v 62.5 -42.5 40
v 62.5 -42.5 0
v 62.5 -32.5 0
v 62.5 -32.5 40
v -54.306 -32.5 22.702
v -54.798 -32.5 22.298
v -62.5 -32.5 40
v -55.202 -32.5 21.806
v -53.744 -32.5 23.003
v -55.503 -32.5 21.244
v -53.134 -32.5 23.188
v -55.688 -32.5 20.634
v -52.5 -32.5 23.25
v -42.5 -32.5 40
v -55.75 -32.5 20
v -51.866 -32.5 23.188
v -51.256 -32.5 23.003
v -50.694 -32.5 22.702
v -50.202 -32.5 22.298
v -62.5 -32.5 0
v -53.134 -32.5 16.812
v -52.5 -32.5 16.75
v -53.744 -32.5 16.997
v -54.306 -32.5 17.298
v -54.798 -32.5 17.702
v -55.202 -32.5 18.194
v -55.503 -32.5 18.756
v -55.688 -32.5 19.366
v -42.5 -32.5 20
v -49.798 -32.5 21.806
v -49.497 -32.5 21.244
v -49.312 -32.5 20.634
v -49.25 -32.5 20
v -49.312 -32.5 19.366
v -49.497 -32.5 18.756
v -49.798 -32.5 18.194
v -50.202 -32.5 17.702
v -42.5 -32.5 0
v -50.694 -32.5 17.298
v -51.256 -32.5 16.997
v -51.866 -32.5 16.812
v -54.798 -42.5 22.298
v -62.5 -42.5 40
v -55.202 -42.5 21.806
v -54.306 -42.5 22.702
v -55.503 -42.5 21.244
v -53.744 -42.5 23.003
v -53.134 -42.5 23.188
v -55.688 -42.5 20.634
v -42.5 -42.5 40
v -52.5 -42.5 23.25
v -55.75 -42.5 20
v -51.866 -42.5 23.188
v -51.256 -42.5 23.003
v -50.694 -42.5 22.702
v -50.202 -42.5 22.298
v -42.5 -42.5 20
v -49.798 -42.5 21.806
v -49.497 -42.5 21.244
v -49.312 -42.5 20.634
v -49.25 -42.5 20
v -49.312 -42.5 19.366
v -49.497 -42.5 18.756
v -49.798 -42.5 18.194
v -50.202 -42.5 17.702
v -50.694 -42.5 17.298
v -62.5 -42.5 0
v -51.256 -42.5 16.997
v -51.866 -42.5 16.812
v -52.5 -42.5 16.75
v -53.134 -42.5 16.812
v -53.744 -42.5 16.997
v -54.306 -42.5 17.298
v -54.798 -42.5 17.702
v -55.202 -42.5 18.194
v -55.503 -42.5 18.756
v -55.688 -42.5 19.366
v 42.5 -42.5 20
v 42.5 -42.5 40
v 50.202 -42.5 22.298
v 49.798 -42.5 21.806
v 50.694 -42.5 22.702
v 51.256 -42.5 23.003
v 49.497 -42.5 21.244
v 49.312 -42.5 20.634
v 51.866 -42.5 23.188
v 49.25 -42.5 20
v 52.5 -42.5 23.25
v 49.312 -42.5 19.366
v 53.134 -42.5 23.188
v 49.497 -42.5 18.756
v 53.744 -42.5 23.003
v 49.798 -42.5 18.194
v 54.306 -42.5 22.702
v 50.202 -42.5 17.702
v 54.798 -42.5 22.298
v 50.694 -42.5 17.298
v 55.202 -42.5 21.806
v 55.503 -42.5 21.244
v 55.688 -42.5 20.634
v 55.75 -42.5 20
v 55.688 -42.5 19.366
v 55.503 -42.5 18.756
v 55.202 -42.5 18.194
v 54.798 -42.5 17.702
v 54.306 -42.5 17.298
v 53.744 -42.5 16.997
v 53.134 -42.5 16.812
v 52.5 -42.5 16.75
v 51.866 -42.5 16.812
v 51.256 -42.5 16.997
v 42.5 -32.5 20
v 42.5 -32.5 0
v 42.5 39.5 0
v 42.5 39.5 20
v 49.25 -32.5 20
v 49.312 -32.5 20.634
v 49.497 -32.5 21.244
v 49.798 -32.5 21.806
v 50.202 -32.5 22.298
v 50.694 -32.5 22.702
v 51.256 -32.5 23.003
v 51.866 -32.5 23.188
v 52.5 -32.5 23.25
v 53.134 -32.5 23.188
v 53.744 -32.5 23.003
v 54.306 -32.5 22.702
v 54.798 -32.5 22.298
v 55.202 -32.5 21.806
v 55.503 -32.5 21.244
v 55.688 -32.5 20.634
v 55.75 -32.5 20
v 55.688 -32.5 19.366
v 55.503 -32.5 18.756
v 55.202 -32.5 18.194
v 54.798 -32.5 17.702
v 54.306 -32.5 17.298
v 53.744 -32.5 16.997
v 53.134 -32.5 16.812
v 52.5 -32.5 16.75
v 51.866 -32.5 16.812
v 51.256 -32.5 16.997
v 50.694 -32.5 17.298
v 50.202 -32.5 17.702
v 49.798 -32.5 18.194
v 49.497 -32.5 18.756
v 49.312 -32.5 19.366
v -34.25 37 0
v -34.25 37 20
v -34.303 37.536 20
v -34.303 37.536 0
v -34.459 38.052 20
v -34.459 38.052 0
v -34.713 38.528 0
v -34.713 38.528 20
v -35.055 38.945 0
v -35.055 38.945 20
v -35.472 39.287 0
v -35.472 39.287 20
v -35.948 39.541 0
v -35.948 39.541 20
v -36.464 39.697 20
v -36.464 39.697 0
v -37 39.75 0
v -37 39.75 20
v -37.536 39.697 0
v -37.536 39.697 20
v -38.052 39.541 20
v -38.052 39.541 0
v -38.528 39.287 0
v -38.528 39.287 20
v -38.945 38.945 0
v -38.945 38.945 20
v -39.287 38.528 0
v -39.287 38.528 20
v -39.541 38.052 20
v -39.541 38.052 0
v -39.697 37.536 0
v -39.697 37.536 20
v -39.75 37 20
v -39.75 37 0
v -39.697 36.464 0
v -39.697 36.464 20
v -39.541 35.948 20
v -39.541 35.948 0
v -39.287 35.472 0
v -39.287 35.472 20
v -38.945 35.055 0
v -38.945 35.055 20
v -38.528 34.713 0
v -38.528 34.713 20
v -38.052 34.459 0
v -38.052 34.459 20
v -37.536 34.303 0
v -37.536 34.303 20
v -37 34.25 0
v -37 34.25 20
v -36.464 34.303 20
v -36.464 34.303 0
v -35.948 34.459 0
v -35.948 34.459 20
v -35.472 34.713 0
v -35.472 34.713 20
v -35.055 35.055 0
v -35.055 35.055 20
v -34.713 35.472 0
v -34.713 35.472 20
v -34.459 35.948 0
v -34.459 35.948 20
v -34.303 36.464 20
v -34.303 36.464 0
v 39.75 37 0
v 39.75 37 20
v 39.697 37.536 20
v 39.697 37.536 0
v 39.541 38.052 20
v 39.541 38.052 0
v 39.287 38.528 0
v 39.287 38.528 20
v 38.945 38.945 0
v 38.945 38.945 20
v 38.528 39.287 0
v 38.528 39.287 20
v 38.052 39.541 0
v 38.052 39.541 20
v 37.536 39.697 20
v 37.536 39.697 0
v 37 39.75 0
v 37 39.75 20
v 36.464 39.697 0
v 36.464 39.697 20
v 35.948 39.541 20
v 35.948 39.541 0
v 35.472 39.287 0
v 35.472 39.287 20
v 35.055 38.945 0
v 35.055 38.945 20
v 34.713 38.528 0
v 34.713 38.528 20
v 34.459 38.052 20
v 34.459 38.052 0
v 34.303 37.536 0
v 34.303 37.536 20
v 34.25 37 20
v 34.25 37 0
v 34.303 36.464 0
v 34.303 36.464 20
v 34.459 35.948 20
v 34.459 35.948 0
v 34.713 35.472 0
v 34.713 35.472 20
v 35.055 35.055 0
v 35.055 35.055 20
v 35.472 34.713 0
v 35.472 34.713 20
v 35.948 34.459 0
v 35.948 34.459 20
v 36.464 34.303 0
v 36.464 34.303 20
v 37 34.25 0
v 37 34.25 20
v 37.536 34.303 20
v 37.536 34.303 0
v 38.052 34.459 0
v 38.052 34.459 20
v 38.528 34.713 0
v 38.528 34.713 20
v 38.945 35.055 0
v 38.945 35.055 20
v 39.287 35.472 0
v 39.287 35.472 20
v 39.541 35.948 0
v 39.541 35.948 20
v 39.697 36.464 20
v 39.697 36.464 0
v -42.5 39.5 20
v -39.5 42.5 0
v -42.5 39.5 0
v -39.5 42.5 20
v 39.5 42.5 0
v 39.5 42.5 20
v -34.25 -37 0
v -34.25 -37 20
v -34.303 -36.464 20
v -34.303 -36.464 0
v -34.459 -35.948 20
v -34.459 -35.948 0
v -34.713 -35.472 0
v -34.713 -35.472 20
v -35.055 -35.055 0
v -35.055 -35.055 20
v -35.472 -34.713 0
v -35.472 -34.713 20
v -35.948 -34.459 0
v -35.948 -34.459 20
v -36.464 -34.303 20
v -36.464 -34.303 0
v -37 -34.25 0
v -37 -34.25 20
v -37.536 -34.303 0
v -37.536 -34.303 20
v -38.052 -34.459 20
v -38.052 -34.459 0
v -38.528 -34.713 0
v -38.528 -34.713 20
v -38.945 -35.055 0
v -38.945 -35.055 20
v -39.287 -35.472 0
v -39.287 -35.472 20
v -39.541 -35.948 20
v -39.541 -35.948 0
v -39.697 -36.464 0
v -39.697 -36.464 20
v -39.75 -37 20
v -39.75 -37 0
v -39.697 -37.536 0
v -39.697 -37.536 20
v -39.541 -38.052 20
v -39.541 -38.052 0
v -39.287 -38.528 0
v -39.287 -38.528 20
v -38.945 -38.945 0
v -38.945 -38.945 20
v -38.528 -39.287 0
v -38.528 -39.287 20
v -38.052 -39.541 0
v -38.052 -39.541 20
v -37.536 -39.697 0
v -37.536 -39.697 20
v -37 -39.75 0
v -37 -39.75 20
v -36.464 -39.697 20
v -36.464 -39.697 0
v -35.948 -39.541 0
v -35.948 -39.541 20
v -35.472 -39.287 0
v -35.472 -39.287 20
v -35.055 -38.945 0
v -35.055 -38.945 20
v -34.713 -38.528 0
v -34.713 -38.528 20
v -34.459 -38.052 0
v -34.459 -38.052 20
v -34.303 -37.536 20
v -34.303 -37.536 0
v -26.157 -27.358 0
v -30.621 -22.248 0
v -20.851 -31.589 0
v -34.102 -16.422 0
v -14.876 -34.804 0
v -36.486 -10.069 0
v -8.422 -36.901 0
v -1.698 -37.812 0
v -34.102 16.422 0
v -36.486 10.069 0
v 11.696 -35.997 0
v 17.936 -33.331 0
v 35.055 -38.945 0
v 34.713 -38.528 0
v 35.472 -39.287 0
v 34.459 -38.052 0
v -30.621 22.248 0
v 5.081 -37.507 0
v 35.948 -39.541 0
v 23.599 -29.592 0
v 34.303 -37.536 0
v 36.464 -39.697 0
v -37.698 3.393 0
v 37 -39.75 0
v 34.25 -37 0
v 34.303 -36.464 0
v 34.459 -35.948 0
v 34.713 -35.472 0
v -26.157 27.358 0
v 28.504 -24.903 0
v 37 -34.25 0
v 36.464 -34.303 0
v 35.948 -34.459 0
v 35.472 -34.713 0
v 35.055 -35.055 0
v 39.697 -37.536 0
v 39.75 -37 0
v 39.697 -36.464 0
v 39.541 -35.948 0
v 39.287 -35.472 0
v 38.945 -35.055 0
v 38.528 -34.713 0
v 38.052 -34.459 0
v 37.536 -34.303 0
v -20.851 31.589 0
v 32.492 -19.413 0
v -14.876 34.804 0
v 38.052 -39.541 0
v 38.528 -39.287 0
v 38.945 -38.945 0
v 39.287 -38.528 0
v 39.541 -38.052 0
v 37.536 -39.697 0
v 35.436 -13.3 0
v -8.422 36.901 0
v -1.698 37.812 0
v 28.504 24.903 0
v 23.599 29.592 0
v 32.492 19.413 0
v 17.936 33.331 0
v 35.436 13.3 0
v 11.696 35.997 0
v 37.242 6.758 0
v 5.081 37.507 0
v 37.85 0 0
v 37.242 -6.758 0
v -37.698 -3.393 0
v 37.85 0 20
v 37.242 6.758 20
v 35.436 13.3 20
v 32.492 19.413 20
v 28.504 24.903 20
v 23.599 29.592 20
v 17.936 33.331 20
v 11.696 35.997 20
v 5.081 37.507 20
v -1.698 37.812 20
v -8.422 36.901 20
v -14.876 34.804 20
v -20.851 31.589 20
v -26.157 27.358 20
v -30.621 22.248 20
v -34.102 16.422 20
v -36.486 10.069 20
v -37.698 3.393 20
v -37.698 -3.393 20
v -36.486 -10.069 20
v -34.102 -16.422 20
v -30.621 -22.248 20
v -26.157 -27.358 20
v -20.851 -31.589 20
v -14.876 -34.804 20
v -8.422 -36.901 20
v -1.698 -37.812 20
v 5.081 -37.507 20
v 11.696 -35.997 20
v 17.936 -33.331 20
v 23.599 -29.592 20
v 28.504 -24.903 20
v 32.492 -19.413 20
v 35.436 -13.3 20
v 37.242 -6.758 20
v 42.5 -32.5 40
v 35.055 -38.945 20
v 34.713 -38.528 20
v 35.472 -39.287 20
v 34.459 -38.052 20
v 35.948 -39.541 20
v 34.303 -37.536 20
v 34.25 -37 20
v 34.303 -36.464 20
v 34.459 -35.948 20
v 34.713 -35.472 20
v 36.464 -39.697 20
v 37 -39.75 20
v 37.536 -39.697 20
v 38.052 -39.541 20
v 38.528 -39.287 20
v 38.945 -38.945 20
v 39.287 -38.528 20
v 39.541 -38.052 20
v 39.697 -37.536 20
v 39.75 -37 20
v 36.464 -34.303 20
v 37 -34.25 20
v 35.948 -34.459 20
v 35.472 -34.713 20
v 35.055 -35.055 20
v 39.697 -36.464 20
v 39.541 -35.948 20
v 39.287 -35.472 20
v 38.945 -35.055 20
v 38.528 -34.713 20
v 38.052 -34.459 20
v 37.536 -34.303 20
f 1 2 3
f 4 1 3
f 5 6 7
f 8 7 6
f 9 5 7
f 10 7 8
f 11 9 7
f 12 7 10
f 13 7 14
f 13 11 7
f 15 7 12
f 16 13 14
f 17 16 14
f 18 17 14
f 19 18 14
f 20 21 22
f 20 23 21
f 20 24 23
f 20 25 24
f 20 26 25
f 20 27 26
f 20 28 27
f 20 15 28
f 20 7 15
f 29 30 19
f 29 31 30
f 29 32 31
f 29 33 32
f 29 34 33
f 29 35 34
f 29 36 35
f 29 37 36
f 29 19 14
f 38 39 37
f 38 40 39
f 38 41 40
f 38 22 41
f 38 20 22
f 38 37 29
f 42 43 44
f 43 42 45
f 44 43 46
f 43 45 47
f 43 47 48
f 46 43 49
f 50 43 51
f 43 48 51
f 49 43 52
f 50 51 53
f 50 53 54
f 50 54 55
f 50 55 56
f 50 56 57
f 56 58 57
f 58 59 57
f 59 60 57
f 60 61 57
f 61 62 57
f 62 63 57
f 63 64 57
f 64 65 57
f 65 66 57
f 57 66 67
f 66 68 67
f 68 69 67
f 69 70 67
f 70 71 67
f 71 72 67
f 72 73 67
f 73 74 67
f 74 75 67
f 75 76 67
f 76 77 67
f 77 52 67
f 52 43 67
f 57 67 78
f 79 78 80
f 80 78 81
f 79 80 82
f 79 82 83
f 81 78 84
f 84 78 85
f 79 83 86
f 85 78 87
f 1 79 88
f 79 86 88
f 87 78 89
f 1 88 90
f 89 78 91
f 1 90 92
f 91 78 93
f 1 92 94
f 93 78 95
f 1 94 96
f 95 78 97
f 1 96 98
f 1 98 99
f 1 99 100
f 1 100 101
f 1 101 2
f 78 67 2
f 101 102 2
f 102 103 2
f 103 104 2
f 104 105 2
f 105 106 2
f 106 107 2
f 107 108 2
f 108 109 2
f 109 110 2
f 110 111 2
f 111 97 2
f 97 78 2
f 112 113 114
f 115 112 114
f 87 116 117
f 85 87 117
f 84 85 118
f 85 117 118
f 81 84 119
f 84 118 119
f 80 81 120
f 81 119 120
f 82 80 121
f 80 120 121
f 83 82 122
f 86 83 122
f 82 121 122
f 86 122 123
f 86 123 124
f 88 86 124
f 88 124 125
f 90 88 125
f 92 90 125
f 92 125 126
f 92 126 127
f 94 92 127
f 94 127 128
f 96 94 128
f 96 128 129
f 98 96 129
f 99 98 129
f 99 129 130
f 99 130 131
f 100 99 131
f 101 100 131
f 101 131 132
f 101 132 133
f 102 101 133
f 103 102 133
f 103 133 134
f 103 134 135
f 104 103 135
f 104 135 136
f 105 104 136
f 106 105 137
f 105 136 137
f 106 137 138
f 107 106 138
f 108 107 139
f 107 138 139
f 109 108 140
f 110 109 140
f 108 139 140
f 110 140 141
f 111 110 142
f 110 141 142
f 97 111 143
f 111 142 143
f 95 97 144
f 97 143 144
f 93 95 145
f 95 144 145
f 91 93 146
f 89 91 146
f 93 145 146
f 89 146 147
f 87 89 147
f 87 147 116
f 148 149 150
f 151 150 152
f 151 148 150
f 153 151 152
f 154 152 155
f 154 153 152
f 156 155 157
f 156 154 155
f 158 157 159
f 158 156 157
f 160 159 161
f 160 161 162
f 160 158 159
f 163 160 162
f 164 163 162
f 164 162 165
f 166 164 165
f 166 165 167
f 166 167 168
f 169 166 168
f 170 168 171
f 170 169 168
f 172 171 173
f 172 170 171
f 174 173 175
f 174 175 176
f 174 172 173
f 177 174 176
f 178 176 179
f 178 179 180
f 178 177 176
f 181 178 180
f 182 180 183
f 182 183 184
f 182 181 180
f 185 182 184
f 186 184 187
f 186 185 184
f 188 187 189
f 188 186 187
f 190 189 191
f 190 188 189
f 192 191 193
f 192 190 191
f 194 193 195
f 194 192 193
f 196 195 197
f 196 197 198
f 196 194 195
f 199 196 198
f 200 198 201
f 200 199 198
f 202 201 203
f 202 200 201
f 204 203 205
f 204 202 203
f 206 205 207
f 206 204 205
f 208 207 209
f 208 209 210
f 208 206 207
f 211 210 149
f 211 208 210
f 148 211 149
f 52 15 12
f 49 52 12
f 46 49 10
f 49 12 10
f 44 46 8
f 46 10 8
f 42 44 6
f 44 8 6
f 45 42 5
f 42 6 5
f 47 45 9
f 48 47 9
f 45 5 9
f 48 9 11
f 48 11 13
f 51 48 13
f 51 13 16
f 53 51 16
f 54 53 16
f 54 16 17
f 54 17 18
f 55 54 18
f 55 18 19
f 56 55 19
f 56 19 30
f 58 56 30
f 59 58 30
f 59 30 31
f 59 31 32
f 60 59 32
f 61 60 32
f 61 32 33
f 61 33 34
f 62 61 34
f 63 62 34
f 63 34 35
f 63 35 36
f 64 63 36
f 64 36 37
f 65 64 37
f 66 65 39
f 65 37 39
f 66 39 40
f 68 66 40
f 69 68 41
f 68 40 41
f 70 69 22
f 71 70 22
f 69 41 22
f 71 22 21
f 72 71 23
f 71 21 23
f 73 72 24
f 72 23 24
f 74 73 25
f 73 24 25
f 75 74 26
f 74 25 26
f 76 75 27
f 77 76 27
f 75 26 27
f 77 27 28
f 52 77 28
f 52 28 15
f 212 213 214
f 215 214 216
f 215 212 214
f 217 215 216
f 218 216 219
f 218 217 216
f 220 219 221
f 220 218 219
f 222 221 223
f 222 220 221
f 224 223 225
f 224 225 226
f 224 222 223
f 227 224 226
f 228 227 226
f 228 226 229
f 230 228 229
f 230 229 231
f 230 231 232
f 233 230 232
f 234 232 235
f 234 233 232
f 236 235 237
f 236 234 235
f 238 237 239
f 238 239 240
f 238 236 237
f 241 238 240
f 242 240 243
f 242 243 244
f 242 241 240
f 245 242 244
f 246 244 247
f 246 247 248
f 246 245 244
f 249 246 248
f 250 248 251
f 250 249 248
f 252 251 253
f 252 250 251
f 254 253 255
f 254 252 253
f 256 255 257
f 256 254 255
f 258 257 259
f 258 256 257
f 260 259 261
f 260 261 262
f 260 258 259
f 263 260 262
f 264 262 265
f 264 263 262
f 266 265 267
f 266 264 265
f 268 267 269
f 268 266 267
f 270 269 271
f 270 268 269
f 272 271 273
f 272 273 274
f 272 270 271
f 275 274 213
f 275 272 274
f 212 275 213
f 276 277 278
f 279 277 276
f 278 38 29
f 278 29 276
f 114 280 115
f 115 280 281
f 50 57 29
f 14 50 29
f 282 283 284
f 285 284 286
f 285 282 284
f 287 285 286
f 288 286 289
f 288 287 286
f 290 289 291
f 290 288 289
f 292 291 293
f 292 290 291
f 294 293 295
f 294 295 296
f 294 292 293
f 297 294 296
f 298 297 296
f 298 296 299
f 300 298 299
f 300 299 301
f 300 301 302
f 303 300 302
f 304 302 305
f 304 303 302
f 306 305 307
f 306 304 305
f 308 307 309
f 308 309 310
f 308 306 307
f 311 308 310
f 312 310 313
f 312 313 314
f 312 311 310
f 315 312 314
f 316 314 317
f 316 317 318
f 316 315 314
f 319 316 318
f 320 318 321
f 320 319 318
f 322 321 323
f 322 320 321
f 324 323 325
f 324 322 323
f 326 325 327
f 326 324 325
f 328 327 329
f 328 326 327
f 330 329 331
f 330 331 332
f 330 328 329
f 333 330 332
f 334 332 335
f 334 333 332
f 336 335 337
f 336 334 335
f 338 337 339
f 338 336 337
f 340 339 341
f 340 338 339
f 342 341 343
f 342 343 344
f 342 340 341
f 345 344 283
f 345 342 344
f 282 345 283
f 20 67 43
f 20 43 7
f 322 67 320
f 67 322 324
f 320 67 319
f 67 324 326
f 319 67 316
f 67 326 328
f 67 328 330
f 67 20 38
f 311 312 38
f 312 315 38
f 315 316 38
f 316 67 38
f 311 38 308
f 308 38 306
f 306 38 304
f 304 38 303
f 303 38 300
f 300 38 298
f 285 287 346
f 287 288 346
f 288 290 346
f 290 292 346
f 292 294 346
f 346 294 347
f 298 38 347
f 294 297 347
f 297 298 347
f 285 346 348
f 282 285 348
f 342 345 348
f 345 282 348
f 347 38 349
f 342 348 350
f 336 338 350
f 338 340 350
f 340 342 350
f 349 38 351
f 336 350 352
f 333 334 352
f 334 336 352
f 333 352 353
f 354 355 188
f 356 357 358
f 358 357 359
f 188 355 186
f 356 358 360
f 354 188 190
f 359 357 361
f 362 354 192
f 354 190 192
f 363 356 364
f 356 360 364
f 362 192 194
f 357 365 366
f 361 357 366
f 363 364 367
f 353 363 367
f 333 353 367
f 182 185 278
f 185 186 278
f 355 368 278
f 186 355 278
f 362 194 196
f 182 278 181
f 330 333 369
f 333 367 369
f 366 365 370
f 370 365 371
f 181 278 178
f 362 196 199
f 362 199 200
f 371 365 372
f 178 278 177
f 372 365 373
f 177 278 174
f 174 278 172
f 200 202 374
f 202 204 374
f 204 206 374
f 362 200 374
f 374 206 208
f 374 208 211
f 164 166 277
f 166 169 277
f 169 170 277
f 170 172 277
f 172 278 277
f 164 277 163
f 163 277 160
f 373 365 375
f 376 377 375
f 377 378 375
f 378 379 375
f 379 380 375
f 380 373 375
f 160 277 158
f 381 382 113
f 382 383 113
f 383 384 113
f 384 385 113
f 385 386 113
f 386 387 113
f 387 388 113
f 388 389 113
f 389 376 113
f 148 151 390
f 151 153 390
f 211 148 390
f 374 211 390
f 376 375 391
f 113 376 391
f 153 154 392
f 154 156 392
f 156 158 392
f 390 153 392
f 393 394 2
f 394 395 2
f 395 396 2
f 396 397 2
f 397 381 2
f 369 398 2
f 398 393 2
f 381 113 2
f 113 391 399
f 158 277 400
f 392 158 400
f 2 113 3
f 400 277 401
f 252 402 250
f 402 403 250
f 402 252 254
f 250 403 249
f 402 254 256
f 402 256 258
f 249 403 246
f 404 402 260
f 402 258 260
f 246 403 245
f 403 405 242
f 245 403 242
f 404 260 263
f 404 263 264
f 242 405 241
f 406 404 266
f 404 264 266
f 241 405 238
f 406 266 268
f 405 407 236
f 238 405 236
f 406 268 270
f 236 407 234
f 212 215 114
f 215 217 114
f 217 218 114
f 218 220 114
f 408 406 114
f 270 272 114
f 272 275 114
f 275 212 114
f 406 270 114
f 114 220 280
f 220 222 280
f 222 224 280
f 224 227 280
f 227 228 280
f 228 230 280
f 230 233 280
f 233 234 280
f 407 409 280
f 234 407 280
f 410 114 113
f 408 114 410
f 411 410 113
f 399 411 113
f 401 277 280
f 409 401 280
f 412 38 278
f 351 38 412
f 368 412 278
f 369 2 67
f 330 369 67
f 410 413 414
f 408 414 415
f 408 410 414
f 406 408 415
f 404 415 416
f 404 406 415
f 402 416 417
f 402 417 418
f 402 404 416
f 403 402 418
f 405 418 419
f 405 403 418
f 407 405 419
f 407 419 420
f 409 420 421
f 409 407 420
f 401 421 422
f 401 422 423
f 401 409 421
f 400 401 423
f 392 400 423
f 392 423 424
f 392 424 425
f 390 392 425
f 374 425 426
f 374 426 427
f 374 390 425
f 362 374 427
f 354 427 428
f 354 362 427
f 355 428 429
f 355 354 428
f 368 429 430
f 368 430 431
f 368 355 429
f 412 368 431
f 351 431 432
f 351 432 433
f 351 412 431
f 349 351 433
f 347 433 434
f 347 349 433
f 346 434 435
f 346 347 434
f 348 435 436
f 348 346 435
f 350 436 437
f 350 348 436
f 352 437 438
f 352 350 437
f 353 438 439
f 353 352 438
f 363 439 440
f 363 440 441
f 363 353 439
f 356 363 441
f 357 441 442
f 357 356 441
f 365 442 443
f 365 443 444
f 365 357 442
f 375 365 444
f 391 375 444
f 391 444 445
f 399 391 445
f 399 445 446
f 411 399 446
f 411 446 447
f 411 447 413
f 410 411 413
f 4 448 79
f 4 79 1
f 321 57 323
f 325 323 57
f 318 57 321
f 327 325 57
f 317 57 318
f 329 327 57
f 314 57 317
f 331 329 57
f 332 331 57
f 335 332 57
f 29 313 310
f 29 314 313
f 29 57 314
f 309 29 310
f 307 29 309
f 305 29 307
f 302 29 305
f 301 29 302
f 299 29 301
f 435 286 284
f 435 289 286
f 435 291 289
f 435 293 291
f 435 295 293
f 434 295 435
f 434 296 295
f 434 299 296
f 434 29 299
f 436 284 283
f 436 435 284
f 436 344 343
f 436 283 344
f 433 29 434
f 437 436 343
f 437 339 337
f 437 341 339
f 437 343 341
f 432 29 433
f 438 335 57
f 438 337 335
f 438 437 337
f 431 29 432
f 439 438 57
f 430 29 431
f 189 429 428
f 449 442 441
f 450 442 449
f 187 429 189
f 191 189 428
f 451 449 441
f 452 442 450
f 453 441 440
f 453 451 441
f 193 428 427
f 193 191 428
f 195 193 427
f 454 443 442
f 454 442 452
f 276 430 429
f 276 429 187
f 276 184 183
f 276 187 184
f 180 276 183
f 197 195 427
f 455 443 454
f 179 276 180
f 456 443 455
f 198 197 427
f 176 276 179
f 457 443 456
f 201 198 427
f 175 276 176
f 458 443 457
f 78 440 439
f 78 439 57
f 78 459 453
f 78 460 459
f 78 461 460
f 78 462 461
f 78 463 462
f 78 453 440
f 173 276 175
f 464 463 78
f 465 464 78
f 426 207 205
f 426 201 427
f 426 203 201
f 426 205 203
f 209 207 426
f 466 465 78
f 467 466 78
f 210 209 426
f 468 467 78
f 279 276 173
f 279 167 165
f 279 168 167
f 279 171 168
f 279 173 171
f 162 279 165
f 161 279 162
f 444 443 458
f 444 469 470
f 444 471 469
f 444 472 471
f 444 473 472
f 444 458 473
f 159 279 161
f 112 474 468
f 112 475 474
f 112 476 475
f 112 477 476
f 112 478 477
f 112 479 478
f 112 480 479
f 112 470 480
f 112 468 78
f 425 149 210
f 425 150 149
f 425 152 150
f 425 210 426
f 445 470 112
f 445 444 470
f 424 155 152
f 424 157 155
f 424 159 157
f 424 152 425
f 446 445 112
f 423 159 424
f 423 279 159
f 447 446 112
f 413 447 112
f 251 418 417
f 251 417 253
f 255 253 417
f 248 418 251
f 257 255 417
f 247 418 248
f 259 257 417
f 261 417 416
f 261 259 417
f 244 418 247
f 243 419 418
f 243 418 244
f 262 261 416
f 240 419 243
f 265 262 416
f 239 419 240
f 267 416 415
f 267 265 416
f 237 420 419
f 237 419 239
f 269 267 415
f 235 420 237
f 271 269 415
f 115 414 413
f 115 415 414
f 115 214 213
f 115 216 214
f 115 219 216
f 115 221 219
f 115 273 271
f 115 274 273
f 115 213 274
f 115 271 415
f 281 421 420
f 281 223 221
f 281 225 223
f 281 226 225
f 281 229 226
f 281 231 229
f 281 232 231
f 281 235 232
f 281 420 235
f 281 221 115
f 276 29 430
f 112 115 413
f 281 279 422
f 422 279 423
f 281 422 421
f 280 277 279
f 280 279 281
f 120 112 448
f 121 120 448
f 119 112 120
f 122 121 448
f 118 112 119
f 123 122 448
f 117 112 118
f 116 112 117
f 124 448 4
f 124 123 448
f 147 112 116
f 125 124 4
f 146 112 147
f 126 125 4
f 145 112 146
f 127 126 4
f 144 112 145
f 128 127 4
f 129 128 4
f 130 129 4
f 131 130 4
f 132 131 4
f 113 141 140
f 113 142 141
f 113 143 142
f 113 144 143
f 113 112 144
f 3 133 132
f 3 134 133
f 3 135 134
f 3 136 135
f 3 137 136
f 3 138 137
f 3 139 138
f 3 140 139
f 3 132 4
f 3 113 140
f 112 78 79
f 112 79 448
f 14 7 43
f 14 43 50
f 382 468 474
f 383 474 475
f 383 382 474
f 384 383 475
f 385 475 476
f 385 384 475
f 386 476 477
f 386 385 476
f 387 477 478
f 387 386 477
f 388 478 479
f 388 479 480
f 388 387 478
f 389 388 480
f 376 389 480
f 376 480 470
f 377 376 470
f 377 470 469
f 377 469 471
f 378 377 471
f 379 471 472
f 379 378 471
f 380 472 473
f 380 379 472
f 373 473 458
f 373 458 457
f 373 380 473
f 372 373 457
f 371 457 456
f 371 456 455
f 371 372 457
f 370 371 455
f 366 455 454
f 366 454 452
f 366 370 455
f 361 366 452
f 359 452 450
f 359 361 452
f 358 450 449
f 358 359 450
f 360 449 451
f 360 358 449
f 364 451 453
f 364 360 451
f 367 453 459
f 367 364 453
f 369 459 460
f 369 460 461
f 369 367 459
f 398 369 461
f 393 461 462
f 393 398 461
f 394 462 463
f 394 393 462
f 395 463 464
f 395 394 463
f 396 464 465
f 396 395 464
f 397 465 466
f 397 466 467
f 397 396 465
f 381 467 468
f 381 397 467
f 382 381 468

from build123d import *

# Parameters (mm, degrees)
F0_W     = 85
F0_H     = 85
F0_R     = 2.75
F0_R_2   = 37.85
F1_DEPTH = 20
F2_W     = 20
F2_H     = 10
F3_DEPTH = 40
F4_R     = 3.25
F5_DEPTH = 10.001
F6_SIZE  = 3


with BuildPart() as f1:
    # F0 (on Top) → F1 (new body)
    with BuildSketch(Plane.XY):
        Rectangle(F0_W, F0_H)
        with Locations((-37, -37)):
            Circle(F0_R, mode=Mode.SUBTRACT)
        with Locations((37, -37)):
            Circle(F0_R, mode=Mode.SUBTRACT)
        with Locations((-37, 37)):
            Circle(F0_R, mode=Mode.SUBTRACT)
        Circle(F0_R_2, mode=Mode.SUBTRACT)
        with Locations((37, 37)):
            Circle(F0_R, mode=Mode.SUBTRACT)
    extrude(amount=F1_DEPTH)

    # F2 (on Top) → F3 (join)
    with BuildSketch(Plane.XY):
        with Locations((-52.5, -37.5)):
            Rectangle(F2_W, F2_H)
        with Locations((52.5, -37.5)):
            Rectangle(F2_W, F2_H)
    extrude(amount=F3_DEPTH)

    # F4 (on face) → F5 (cut, through all)
    with BuildSketch(Plane(origin=(0, -32.5, 0), x_dir=(-1, 0, 0), z_dir=(0, 1, 0))):
        with Locations((-52.5, 20)):
            Circle(F4_R)
        with Locations((52.5, 20)):
            Circle(F4_R)
    extrude(amount=-F5_DEPTH, mode=Mode.SUBTRACT)

    # F6
    f6_edges = [f1.edges().sort_by_distance(p)[0] for p in [
        (-42.5, 42.5, 10),
        (42.5, 42.5, 10),
    ]]
    chamfer(f6_edges, length=F6_SIZE)


solid = f1.part
